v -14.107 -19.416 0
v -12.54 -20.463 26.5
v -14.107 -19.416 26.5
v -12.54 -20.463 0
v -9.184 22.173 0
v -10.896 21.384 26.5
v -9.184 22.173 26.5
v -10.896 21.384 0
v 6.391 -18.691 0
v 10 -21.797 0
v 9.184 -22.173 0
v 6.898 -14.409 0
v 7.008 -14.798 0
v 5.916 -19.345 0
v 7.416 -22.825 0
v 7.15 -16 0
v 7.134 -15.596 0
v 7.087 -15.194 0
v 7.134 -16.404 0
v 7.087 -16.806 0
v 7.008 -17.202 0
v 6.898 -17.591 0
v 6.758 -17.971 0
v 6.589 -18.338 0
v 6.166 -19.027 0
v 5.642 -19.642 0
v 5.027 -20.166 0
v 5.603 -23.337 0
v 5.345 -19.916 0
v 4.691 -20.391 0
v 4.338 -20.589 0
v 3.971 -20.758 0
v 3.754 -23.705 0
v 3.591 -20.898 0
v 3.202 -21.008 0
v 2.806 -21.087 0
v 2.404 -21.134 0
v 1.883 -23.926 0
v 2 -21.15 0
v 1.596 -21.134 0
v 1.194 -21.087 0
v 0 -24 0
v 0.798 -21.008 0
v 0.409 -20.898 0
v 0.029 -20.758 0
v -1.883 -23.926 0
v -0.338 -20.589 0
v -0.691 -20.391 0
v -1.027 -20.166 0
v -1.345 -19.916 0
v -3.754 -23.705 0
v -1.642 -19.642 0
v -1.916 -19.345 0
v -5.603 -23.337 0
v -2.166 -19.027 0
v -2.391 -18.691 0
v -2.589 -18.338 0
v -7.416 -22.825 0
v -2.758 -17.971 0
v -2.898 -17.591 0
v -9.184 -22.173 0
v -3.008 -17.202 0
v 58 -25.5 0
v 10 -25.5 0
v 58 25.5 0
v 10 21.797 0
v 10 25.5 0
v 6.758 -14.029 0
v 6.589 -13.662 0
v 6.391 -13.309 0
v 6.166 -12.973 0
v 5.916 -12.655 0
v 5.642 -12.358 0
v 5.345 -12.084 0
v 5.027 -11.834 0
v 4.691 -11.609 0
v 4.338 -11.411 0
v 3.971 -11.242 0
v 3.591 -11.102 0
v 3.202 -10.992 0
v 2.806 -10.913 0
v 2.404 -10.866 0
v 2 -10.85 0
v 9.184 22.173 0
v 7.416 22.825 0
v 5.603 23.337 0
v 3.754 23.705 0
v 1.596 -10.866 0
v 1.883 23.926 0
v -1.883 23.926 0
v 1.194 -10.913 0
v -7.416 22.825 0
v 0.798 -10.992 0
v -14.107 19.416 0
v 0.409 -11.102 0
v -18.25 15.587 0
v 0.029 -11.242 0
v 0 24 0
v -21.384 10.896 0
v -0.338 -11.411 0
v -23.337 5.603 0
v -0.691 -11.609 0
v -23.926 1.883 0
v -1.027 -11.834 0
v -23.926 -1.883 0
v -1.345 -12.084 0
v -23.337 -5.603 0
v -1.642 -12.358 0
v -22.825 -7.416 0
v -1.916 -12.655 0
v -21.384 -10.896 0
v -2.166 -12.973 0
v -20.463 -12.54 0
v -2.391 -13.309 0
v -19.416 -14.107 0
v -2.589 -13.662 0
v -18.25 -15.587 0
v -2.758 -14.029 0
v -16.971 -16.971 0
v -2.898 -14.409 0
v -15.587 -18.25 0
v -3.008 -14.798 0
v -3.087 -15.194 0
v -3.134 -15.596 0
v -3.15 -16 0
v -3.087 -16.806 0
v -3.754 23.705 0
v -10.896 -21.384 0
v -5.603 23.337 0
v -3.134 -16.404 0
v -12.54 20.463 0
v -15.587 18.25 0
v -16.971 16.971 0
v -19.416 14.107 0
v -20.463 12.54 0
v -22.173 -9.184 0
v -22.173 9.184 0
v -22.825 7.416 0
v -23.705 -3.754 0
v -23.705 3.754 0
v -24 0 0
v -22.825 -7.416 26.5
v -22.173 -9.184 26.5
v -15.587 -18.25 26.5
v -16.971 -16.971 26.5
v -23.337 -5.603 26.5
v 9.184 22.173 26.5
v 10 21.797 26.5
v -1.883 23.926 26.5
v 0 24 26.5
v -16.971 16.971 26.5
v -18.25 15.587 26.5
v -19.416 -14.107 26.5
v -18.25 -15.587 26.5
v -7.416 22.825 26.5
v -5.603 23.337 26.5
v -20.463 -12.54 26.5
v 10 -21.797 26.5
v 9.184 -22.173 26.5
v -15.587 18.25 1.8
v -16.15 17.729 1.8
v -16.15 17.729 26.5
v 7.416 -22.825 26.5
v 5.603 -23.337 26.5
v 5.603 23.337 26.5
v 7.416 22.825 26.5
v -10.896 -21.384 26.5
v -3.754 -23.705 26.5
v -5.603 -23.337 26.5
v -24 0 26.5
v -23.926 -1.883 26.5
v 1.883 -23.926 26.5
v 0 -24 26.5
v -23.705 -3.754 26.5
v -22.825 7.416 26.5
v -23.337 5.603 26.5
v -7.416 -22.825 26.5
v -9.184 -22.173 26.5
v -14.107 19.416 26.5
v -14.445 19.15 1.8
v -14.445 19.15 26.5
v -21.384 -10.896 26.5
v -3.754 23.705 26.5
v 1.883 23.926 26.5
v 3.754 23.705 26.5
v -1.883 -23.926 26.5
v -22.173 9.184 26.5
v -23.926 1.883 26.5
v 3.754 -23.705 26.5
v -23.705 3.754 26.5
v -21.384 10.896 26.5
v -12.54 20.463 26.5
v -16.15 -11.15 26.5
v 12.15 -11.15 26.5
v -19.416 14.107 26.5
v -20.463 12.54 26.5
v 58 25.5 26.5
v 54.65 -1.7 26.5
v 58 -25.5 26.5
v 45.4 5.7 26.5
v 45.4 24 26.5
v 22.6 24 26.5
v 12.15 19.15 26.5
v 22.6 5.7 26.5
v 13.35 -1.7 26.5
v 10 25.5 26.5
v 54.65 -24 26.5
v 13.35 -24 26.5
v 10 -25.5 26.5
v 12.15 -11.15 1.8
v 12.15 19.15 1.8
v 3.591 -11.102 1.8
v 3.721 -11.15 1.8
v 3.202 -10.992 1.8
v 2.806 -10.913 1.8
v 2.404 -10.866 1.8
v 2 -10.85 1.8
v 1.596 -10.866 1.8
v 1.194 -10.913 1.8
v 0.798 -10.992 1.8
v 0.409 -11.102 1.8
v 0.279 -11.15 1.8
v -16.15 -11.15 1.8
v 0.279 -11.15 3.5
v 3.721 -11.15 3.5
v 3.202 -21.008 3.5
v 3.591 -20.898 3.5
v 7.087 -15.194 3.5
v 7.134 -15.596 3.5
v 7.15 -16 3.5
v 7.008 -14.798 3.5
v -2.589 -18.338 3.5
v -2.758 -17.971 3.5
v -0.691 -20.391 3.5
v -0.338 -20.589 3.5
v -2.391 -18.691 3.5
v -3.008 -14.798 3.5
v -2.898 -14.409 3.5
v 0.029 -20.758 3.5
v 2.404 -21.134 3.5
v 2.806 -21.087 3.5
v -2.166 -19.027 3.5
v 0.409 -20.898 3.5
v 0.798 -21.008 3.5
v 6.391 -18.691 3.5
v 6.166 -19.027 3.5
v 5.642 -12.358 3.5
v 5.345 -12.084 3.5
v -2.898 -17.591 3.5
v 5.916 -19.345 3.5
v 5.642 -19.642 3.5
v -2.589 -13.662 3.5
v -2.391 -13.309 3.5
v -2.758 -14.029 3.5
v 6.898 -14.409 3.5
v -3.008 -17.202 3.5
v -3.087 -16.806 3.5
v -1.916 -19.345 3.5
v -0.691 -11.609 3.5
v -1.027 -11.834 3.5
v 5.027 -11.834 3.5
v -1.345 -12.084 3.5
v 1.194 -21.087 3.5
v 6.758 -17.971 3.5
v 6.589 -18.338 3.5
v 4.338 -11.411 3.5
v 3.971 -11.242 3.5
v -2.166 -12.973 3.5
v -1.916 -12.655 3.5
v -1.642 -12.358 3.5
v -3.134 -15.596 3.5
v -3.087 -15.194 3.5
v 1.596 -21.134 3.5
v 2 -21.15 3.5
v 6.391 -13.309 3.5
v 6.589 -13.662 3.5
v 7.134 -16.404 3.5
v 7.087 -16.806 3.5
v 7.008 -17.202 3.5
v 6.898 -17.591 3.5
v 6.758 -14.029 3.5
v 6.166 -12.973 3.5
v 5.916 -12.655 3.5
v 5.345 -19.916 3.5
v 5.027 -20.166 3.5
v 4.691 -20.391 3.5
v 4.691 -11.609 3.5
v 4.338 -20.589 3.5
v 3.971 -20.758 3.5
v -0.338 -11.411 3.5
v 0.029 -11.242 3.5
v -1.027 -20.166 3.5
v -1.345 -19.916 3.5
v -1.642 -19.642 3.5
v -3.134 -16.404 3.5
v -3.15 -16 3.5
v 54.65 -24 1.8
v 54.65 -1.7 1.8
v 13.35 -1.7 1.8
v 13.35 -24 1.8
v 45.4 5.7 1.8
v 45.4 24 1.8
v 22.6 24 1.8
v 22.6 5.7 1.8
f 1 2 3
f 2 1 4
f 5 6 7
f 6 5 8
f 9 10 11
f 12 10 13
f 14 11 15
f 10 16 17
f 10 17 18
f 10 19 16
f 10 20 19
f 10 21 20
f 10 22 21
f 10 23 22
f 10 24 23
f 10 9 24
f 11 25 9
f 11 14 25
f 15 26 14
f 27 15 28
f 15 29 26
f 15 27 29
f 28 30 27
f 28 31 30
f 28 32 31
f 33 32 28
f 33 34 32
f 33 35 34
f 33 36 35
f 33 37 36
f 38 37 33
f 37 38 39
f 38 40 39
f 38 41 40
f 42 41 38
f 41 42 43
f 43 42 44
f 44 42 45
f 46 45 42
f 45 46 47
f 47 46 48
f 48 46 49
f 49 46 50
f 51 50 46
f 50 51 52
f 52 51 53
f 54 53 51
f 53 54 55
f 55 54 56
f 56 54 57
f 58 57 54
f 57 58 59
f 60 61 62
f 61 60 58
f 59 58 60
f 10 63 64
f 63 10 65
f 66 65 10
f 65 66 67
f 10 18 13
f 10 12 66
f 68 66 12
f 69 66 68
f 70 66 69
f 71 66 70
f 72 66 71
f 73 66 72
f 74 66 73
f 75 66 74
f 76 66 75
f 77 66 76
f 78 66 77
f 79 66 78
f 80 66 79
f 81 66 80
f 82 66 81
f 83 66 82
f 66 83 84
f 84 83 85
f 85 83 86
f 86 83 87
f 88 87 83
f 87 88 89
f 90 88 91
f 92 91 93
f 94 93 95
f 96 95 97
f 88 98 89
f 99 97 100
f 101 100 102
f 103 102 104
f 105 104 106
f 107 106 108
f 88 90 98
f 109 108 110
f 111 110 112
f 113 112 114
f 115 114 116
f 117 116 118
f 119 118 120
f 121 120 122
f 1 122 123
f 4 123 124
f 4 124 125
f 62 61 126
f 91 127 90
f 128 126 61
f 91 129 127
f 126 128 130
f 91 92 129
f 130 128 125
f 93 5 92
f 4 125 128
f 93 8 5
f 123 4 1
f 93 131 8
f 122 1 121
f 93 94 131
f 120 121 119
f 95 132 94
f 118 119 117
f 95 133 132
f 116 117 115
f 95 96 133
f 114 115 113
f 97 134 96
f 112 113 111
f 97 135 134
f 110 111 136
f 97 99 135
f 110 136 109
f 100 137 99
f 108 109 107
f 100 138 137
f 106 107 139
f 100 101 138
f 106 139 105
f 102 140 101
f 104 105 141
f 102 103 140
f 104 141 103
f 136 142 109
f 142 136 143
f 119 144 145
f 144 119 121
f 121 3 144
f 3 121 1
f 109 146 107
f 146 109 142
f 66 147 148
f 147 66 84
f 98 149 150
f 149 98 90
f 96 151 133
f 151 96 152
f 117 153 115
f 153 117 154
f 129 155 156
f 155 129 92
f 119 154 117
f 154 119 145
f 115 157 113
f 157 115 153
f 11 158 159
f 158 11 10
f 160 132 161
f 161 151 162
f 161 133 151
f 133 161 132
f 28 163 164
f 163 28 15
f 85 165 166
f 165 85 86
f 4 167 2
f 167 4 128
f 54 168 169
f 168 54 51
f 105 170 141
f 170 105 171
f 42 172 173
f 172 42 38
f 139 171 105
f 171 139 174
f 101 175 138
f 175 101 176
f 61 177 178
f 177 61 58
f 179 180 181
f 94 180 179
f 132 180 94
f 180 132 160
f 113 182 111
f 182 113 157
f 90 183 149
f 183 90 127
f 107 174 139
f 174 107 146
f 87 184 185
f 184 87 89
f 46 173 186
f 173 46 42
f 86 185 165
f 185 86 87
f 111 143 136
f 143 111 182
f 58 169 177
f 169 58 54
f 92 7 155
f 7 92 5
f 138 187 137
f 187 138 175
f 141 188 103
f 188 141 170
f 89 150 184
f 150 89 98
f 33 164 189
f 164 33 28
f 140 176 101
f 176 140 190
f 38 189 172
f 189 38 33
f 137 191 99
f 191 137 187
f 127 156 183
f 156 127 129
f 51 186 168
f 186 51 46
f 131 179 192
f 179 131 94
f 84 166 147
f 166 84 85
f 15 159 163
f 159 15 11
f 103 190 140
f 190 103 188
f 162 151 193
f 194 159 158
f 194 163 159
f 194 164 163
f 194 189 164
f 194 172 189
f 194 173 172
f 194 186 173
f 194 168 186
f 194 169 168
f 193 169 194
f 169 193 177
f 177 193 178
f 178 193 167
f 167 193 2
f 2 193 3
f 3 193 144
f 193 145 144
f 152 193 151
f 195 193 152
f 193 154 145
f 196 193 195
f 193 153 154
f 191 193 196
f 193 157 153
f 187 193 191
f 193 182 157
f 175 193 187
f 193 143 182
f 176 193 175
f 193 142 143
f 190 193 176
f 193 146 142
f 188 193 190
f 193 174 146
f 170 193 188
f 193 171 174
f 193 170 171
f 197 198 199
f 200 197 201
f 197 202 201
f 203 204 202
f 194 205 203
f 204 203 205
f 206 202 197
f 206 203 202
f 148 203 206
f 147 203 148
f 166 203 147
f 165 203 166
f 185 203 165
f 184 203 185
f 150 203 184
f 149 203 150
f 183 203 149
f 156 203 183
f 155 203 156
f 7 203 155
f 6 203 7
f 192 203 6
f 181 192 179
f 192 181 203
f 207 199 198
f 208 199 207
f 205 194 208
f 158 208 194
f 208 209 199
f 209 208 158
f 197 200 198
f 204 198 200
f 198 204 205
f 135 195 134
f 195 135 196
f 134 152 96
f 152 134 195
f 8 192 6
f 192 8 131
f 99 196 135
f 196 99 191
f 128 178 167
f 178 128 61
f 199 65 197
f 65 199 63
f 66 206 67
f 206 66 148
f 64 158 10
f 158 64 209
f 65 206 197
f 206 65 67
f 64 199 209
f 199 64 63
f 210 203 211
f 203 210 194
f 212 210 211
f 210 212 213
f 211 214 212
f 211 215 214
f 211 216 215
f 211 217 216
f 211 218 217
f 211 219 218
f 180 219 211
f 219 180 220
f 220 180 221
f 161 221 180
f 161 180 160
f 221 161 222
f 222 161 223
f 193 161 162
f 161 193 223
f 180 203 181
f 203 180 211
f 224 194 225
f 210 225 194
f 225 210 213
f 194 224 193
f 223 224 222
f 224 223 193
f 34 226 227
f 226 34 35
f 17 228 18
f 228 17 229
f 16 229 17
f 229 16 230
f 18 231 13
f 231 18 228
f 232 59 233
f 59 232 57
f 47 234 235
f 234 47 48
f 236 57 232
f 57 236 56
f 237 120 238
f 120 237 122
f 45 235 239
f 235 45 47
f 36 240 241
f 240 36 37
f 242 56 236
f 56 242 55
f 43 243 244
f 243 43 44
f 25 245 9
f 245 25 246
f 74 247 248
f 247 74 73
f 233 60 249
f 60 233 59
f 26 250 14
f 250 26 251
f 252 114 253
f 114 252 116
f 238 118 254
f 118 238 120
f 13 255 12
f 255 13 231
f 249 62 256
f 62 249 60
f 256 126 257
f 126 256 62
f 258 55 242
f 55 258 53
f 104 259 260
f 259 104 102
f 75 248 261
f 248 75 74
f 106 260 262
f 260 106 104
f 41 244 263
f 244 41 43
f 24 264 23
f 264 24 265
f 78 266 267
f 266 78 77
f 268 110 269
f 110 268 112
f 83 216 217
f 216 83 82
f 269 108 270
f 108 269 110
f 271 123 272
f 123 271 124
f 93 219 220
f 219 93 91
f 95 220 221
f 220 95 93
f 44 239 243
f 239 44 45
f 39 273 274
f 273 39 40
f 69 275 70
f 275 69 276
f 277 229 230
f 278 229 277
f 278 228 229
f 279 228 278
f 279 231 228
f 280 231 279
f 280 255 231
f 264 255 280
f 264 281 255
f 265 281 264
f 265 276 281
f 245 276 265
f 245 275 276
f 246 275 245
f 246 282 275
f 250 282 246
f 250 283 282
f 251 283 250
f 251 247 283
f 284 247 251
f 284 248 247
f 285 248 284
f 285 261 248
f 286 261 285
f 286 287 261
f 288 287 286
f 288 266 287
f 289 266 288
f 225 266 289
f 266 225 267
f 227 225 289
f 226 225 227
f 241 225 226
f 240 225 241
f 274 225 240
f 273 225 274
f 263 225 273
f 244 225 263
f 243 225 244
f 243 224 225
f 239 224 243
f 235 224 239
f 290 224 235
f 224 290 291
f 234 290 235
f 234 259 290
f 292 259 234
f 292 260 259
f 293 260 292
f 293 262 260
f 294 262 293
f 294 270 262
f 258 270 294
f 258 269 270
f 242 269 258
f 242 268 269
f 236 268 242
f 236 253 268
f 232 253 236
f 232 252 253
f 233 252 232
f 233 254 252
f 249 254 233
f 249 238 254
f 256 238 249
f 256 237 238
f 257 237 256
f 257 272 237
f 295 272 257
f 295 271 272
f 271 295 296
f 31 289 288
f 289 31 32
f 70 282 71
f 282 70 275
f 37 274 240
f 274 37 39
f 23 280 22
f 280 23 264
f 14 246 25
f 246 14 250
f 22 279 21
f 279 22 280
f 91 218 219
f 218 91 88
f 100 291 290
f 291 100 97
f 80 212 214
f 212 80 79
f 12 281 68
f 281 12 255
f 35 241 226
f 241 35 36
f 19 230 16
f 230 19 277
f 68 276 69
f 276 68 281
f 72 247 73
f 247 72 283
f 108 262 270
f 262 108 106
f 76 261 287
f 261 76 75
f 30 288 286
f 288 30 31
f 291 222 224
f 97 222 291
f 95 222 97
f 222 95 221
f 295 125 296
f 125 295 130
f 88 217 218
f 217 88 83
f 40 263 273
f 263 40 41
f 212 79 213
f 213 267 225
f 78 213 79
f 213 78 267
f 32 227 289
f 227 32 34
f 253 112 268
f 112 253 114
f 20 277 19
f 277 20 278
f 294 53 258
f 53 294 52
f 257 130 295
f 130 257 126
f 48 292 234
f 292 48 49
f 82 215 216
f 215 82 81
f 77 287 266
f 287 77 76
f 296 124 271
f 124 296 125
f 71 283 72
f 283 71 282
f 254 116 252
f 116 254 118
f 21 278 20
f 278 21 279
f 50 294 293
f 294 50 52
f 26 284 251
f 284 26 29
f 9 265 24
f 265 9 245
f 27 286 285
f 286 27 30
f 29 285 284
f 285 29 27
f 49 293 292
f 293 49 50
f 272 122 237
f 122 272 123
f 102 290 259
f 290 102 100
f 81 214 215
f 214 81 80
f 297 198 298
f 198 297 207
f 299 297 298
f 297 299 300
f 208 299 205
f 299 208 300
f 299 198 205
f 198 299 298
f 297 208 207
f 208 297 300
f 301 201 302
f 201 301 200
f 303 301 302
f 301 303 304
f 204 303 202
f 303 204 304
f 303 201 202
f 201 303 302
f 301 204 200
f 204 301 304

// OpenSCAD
// ============================================================
//  Wrist-Puck Keyhole Enclosure — First Draft
//  Rev 1.0  |  July 2026  |  Sean (Whitehorse, YT)
//
//  Replaces the circular puck (wrist_puck_enclosure_5_0.scad) with
//  a keyhole silhouette: a round chamber (servo + arm + LRA) joined
//  to an elongated rectangular body (battery/DRV/PowerBoost stack +
//  XIAO/IMU stack), sized against Sean's actual wrist (53mm wide x
//  35mm thick where the watch sits) rather than a fixed diameter
//  that didn't fit.
//
//  Component numbers below are Sean's own measurements from this
//  session, not the earlier file's assumed values -- several
//  changed (battery is 9mm thick now, not 6mm; servo+arm sweep is
//  28x30mm, not just the 21.5x25.1mm body; PowerBoost/XIAO/IMU all
//  slightly different from the rev5 assumptions). Reused without
//  change: WALL, FLOOR_T, LID_T, CLEARANCE, CAP_T, SNAP_* from
//  wrist_puck_enclosure_5_0.scad -- no reason to re-derive numbers
//  that were already validated there.
//
//  FIRST-PASS FLAGS -- explicit, not buried in comments:
//    - RECT_W (51mm) against Sean's 53mm wrist width leaves only
//      ~1mm clearance per side. That's tight. A real dry-fit is not
//      optional here the way it was borderline-optional elsewhere.
//    - Servo pocket fits chamber inner radius with ~1mm margin --
//      also tight. If the actual arm sweep needs clearance beyond
//      the bounding rectangle, this will need revisiting.
//    - LRA position is a placement guess, not derived from a known
//      arm-sweep direction -- flagged in-line below.
//    - No snap tabs, USB-C cutout, or standoff posts yet -- this
//      draft establishes the outer silhouette and the two internal
//      cavities are load-bearing; those details are next-pass.
//    - No lid/cap yet -- bottom shell only, to get the harder shape
//      right first.
// ============================================================

// ── SHARED CONSTANTS (unchanged from wrist_puck_enclosure_5_0) ──
WALL      = 2.2;
FLOOR_T   = 2.0;
LID_T     = 1.8;
CLEARANCE = 0.3;
CAP_T     = 2.0;

$fn = 80;

// ── OUTER SILHOUETTE ─────────────────────────────────────────
// X = along the forearm (0 = chamber center, increasing toward
//     the rectangular body / strap end)
// Y = across the wrist (must stay under ~53mm total)
// Z = vertical, floor at Z=0, same convention as the circular puck

CHAMBER_D = 48;   // round chamber outer diameter
CHAMBER_R = CHAMBER_D / 2;

RECT_L = 48;    // rectangular body outer length (along arm)
RECT_W = 51;    // rectangular body outer width (across arm) --
                 // SEE FIRST-PASS FLAG ABOVE: tight against 53mm wrist
RECT_X0 = 10;   // where the rectangle starts, overlapping into the
                 // chamber circle for a continuous keyhole silhouette

module outer_silhouette(h) {
    union() {
        cylinder(h = h, d = CHAMBER_D);
        translate([RECT_X0, -RECT_W/2, 0])
            cube([RECT_L, RECT_W, h]);
    }
}

// ── SERVO + ARM (chamber) ────────────────────────────────────
// Sean's measured footprint: 28 x 30mm to the end of the arm swing
// (bounding box, not the bare servo body) x 12mm height.
SERVO_W = 28.0 + CLEARANCE;
SERVO_D = 30.0 + CLEARANCE;
SERVO_H = 12.0 + CLEARANCE;
SERVO_CX = -2;   // roughly centered in the chamber; not yet
SERVO_CY = 4;    // finalized against actual arm swing direction

// ── LRA ───────────────────────────────────────────────────────
// FIRST-PASS PLACEMENT GUESS: tucked into the chamber's leftover
// crescent space, away from the servo footprint above. Needs
// verification once the servo's actual mounting orientation (which
// way the arm swings) is fixed -- it's placed clear of the servo's
// bounding box as currently assumed, not clear of the real swept
// arc if that's smaller than the bounding box suggests.
LRA_DIAM = 10.0 + CLEARANCE;
LRA_H    = 3.5;
LRA_CX   = 2;
LRA_CY   = -16;

// ── POWER STACK (battery / DRV / PowerBoost) ─────────────────
// Stacks in Z exactly like the circular puck did -- same X/Y
// center for all three, different heights. Footprint is the
// battery's own (the largest of the three).
BATT_W = 22.0 + CLEARANCE;   // Sean's measured 22mm (incl. shim/tape)
BATT_D = 41.0 + CLEARANCE;
BATT_H = 9.0;                 // measured, incl. shim/foam/kapton tape

DRV_W = 19.0 + CLEARANCE;
DRV_D = 25.0 + CLEARANCE;
DRV_H = 4.0;

PB_W = 22.0 + CLEARANCE;
PB_D = 36.0 + CLEARANCE;      // Sean's remeasure, was 37 in rev5
PB_H = 7.5;

PWR_CX = RECT_X0 + RECT_L/2;      // roughly centered along the rectangle
PWR_CY = -(RECT_W/2 - BATT_W/2 - 1.5);  // offset to one side, 1.5mm margin off the wall

// ── COMPUTE STACK (XIAO / IMU) ────────────────────────────────
// Also stacks in Z -- XIAO on the floor, IMU on top of it.
// IMU is the header-less 601N1 module: 20.6 x 17.8 x 3mm.
XIAO_W = 22.5 + CLEARANCE;
XIAO_D = 18.0 + CLEARANCE;
XIAO_H = 4.5;

IMU_W = 20.6 + CLEARANCE;
IMU_D = 17.8 + CLEARANCE;
IMU_H = 3.0;   // header-less, per Sean's measurement

CPU_CX = PWR_CX;                              // same X-center as power stack
// Y-offset must use XIAO_D (18.3mm, the across-wrist cube dimension
// below), not XIAO_W -- XIAO_W is the along-arm dimension here since
// its cube is [XIAO_W, XIAO_D, ...], long-side-on-X, same convention
// as the (now-fixed) power stack.
CPU_CY = (RECT_W/2 - XIAO_D/2 - 1.5);

// ── BOTTOM SHELL ───────────────────────────────────────────────
module bottom_shell() {
    // Shell height must clear the TALLEST cavity, not just the
    // servo -- the power stack (battery+DRV+PowerBoost, 20.5mm) is
    // taller than the servo pocket (12.3mm). Missed this on the
    // first pass through this file; caught before rendering, not
    // after.
    power_stack_h = BATT_H + DRV_H + PB_H;
    tallest = max(SERVO_H, power_stack_h, XIAO_H + IMU_H);
    shell_h = FLOOR_T + tallest + 4;   // 4mm margin for lid/wall clearance

    difference() {
        outer_silhouette(shell_h);

        // All three cavities must reach the TOP of the shell (open,
        // not a sealed void) -- components need to go in from above,
        // and a lid (not yet built) will close over the top later.
        // The real bug on the first two passes: each cavity only
        // extended to its OWN component height + a small overshoot,
        // which fell well short of shell_h (sized for the TALLEST
        // cavity). Every cavity was therefore a fully enclosed void
        // sealed on all sides -- no way to insert a battery into a
        // bubble with no opening. This wasn't a CGAL quirk; the
        // "12+12 disconnected triangles" from the connectivity
        // checker was CGAL correctly reporting a hollow-with-trapped-
        // void shape (two genuinely disjoint closed surfaces) -- the
        // checker and CGAL were both right, the geometry was wrong.
        // Fixed by overshooting every cavity's top past shell_h.

        // Servo + arm pocket
        translate([SERVO_CX, SERVO_CY, (FLOOR_T - 0.2 + shell_h + 1)/2])
            cube([SERVO_W, SERVO_D, (shell_h + 1) - (FLOOR_T - 0.2)], center = true);

        // LRA floor pocket (bare skin contact) -- opens through the
        // BOTTOM, not the top, so this one is correct as a short cavity
        translate([LRA_CX, LRA_CY, -0.2])
            cylinder(h = LRA_H + 0.2, d = LRA_DIAM);

        // Power stack cavity
        translate([PWR_CX, PWR_CY, (FLOOR_T - 0.2 + shell_h + 1)/2])
            cube([BATT_D, BATT_W, (shell_h + 1) - (FLOOR_T - 0.2)], center = true);

        // Compute stack cavity
        translate([CPU_CX, CPU_CY, (FLOOR_T - 0.2 + shell_h + 1)/2])
            cube([XIAO_W, XIAO_D, (shell_h + 1) - (FLOOR_T - 0.2)], center = true);
    }
}

bottom_shell();
